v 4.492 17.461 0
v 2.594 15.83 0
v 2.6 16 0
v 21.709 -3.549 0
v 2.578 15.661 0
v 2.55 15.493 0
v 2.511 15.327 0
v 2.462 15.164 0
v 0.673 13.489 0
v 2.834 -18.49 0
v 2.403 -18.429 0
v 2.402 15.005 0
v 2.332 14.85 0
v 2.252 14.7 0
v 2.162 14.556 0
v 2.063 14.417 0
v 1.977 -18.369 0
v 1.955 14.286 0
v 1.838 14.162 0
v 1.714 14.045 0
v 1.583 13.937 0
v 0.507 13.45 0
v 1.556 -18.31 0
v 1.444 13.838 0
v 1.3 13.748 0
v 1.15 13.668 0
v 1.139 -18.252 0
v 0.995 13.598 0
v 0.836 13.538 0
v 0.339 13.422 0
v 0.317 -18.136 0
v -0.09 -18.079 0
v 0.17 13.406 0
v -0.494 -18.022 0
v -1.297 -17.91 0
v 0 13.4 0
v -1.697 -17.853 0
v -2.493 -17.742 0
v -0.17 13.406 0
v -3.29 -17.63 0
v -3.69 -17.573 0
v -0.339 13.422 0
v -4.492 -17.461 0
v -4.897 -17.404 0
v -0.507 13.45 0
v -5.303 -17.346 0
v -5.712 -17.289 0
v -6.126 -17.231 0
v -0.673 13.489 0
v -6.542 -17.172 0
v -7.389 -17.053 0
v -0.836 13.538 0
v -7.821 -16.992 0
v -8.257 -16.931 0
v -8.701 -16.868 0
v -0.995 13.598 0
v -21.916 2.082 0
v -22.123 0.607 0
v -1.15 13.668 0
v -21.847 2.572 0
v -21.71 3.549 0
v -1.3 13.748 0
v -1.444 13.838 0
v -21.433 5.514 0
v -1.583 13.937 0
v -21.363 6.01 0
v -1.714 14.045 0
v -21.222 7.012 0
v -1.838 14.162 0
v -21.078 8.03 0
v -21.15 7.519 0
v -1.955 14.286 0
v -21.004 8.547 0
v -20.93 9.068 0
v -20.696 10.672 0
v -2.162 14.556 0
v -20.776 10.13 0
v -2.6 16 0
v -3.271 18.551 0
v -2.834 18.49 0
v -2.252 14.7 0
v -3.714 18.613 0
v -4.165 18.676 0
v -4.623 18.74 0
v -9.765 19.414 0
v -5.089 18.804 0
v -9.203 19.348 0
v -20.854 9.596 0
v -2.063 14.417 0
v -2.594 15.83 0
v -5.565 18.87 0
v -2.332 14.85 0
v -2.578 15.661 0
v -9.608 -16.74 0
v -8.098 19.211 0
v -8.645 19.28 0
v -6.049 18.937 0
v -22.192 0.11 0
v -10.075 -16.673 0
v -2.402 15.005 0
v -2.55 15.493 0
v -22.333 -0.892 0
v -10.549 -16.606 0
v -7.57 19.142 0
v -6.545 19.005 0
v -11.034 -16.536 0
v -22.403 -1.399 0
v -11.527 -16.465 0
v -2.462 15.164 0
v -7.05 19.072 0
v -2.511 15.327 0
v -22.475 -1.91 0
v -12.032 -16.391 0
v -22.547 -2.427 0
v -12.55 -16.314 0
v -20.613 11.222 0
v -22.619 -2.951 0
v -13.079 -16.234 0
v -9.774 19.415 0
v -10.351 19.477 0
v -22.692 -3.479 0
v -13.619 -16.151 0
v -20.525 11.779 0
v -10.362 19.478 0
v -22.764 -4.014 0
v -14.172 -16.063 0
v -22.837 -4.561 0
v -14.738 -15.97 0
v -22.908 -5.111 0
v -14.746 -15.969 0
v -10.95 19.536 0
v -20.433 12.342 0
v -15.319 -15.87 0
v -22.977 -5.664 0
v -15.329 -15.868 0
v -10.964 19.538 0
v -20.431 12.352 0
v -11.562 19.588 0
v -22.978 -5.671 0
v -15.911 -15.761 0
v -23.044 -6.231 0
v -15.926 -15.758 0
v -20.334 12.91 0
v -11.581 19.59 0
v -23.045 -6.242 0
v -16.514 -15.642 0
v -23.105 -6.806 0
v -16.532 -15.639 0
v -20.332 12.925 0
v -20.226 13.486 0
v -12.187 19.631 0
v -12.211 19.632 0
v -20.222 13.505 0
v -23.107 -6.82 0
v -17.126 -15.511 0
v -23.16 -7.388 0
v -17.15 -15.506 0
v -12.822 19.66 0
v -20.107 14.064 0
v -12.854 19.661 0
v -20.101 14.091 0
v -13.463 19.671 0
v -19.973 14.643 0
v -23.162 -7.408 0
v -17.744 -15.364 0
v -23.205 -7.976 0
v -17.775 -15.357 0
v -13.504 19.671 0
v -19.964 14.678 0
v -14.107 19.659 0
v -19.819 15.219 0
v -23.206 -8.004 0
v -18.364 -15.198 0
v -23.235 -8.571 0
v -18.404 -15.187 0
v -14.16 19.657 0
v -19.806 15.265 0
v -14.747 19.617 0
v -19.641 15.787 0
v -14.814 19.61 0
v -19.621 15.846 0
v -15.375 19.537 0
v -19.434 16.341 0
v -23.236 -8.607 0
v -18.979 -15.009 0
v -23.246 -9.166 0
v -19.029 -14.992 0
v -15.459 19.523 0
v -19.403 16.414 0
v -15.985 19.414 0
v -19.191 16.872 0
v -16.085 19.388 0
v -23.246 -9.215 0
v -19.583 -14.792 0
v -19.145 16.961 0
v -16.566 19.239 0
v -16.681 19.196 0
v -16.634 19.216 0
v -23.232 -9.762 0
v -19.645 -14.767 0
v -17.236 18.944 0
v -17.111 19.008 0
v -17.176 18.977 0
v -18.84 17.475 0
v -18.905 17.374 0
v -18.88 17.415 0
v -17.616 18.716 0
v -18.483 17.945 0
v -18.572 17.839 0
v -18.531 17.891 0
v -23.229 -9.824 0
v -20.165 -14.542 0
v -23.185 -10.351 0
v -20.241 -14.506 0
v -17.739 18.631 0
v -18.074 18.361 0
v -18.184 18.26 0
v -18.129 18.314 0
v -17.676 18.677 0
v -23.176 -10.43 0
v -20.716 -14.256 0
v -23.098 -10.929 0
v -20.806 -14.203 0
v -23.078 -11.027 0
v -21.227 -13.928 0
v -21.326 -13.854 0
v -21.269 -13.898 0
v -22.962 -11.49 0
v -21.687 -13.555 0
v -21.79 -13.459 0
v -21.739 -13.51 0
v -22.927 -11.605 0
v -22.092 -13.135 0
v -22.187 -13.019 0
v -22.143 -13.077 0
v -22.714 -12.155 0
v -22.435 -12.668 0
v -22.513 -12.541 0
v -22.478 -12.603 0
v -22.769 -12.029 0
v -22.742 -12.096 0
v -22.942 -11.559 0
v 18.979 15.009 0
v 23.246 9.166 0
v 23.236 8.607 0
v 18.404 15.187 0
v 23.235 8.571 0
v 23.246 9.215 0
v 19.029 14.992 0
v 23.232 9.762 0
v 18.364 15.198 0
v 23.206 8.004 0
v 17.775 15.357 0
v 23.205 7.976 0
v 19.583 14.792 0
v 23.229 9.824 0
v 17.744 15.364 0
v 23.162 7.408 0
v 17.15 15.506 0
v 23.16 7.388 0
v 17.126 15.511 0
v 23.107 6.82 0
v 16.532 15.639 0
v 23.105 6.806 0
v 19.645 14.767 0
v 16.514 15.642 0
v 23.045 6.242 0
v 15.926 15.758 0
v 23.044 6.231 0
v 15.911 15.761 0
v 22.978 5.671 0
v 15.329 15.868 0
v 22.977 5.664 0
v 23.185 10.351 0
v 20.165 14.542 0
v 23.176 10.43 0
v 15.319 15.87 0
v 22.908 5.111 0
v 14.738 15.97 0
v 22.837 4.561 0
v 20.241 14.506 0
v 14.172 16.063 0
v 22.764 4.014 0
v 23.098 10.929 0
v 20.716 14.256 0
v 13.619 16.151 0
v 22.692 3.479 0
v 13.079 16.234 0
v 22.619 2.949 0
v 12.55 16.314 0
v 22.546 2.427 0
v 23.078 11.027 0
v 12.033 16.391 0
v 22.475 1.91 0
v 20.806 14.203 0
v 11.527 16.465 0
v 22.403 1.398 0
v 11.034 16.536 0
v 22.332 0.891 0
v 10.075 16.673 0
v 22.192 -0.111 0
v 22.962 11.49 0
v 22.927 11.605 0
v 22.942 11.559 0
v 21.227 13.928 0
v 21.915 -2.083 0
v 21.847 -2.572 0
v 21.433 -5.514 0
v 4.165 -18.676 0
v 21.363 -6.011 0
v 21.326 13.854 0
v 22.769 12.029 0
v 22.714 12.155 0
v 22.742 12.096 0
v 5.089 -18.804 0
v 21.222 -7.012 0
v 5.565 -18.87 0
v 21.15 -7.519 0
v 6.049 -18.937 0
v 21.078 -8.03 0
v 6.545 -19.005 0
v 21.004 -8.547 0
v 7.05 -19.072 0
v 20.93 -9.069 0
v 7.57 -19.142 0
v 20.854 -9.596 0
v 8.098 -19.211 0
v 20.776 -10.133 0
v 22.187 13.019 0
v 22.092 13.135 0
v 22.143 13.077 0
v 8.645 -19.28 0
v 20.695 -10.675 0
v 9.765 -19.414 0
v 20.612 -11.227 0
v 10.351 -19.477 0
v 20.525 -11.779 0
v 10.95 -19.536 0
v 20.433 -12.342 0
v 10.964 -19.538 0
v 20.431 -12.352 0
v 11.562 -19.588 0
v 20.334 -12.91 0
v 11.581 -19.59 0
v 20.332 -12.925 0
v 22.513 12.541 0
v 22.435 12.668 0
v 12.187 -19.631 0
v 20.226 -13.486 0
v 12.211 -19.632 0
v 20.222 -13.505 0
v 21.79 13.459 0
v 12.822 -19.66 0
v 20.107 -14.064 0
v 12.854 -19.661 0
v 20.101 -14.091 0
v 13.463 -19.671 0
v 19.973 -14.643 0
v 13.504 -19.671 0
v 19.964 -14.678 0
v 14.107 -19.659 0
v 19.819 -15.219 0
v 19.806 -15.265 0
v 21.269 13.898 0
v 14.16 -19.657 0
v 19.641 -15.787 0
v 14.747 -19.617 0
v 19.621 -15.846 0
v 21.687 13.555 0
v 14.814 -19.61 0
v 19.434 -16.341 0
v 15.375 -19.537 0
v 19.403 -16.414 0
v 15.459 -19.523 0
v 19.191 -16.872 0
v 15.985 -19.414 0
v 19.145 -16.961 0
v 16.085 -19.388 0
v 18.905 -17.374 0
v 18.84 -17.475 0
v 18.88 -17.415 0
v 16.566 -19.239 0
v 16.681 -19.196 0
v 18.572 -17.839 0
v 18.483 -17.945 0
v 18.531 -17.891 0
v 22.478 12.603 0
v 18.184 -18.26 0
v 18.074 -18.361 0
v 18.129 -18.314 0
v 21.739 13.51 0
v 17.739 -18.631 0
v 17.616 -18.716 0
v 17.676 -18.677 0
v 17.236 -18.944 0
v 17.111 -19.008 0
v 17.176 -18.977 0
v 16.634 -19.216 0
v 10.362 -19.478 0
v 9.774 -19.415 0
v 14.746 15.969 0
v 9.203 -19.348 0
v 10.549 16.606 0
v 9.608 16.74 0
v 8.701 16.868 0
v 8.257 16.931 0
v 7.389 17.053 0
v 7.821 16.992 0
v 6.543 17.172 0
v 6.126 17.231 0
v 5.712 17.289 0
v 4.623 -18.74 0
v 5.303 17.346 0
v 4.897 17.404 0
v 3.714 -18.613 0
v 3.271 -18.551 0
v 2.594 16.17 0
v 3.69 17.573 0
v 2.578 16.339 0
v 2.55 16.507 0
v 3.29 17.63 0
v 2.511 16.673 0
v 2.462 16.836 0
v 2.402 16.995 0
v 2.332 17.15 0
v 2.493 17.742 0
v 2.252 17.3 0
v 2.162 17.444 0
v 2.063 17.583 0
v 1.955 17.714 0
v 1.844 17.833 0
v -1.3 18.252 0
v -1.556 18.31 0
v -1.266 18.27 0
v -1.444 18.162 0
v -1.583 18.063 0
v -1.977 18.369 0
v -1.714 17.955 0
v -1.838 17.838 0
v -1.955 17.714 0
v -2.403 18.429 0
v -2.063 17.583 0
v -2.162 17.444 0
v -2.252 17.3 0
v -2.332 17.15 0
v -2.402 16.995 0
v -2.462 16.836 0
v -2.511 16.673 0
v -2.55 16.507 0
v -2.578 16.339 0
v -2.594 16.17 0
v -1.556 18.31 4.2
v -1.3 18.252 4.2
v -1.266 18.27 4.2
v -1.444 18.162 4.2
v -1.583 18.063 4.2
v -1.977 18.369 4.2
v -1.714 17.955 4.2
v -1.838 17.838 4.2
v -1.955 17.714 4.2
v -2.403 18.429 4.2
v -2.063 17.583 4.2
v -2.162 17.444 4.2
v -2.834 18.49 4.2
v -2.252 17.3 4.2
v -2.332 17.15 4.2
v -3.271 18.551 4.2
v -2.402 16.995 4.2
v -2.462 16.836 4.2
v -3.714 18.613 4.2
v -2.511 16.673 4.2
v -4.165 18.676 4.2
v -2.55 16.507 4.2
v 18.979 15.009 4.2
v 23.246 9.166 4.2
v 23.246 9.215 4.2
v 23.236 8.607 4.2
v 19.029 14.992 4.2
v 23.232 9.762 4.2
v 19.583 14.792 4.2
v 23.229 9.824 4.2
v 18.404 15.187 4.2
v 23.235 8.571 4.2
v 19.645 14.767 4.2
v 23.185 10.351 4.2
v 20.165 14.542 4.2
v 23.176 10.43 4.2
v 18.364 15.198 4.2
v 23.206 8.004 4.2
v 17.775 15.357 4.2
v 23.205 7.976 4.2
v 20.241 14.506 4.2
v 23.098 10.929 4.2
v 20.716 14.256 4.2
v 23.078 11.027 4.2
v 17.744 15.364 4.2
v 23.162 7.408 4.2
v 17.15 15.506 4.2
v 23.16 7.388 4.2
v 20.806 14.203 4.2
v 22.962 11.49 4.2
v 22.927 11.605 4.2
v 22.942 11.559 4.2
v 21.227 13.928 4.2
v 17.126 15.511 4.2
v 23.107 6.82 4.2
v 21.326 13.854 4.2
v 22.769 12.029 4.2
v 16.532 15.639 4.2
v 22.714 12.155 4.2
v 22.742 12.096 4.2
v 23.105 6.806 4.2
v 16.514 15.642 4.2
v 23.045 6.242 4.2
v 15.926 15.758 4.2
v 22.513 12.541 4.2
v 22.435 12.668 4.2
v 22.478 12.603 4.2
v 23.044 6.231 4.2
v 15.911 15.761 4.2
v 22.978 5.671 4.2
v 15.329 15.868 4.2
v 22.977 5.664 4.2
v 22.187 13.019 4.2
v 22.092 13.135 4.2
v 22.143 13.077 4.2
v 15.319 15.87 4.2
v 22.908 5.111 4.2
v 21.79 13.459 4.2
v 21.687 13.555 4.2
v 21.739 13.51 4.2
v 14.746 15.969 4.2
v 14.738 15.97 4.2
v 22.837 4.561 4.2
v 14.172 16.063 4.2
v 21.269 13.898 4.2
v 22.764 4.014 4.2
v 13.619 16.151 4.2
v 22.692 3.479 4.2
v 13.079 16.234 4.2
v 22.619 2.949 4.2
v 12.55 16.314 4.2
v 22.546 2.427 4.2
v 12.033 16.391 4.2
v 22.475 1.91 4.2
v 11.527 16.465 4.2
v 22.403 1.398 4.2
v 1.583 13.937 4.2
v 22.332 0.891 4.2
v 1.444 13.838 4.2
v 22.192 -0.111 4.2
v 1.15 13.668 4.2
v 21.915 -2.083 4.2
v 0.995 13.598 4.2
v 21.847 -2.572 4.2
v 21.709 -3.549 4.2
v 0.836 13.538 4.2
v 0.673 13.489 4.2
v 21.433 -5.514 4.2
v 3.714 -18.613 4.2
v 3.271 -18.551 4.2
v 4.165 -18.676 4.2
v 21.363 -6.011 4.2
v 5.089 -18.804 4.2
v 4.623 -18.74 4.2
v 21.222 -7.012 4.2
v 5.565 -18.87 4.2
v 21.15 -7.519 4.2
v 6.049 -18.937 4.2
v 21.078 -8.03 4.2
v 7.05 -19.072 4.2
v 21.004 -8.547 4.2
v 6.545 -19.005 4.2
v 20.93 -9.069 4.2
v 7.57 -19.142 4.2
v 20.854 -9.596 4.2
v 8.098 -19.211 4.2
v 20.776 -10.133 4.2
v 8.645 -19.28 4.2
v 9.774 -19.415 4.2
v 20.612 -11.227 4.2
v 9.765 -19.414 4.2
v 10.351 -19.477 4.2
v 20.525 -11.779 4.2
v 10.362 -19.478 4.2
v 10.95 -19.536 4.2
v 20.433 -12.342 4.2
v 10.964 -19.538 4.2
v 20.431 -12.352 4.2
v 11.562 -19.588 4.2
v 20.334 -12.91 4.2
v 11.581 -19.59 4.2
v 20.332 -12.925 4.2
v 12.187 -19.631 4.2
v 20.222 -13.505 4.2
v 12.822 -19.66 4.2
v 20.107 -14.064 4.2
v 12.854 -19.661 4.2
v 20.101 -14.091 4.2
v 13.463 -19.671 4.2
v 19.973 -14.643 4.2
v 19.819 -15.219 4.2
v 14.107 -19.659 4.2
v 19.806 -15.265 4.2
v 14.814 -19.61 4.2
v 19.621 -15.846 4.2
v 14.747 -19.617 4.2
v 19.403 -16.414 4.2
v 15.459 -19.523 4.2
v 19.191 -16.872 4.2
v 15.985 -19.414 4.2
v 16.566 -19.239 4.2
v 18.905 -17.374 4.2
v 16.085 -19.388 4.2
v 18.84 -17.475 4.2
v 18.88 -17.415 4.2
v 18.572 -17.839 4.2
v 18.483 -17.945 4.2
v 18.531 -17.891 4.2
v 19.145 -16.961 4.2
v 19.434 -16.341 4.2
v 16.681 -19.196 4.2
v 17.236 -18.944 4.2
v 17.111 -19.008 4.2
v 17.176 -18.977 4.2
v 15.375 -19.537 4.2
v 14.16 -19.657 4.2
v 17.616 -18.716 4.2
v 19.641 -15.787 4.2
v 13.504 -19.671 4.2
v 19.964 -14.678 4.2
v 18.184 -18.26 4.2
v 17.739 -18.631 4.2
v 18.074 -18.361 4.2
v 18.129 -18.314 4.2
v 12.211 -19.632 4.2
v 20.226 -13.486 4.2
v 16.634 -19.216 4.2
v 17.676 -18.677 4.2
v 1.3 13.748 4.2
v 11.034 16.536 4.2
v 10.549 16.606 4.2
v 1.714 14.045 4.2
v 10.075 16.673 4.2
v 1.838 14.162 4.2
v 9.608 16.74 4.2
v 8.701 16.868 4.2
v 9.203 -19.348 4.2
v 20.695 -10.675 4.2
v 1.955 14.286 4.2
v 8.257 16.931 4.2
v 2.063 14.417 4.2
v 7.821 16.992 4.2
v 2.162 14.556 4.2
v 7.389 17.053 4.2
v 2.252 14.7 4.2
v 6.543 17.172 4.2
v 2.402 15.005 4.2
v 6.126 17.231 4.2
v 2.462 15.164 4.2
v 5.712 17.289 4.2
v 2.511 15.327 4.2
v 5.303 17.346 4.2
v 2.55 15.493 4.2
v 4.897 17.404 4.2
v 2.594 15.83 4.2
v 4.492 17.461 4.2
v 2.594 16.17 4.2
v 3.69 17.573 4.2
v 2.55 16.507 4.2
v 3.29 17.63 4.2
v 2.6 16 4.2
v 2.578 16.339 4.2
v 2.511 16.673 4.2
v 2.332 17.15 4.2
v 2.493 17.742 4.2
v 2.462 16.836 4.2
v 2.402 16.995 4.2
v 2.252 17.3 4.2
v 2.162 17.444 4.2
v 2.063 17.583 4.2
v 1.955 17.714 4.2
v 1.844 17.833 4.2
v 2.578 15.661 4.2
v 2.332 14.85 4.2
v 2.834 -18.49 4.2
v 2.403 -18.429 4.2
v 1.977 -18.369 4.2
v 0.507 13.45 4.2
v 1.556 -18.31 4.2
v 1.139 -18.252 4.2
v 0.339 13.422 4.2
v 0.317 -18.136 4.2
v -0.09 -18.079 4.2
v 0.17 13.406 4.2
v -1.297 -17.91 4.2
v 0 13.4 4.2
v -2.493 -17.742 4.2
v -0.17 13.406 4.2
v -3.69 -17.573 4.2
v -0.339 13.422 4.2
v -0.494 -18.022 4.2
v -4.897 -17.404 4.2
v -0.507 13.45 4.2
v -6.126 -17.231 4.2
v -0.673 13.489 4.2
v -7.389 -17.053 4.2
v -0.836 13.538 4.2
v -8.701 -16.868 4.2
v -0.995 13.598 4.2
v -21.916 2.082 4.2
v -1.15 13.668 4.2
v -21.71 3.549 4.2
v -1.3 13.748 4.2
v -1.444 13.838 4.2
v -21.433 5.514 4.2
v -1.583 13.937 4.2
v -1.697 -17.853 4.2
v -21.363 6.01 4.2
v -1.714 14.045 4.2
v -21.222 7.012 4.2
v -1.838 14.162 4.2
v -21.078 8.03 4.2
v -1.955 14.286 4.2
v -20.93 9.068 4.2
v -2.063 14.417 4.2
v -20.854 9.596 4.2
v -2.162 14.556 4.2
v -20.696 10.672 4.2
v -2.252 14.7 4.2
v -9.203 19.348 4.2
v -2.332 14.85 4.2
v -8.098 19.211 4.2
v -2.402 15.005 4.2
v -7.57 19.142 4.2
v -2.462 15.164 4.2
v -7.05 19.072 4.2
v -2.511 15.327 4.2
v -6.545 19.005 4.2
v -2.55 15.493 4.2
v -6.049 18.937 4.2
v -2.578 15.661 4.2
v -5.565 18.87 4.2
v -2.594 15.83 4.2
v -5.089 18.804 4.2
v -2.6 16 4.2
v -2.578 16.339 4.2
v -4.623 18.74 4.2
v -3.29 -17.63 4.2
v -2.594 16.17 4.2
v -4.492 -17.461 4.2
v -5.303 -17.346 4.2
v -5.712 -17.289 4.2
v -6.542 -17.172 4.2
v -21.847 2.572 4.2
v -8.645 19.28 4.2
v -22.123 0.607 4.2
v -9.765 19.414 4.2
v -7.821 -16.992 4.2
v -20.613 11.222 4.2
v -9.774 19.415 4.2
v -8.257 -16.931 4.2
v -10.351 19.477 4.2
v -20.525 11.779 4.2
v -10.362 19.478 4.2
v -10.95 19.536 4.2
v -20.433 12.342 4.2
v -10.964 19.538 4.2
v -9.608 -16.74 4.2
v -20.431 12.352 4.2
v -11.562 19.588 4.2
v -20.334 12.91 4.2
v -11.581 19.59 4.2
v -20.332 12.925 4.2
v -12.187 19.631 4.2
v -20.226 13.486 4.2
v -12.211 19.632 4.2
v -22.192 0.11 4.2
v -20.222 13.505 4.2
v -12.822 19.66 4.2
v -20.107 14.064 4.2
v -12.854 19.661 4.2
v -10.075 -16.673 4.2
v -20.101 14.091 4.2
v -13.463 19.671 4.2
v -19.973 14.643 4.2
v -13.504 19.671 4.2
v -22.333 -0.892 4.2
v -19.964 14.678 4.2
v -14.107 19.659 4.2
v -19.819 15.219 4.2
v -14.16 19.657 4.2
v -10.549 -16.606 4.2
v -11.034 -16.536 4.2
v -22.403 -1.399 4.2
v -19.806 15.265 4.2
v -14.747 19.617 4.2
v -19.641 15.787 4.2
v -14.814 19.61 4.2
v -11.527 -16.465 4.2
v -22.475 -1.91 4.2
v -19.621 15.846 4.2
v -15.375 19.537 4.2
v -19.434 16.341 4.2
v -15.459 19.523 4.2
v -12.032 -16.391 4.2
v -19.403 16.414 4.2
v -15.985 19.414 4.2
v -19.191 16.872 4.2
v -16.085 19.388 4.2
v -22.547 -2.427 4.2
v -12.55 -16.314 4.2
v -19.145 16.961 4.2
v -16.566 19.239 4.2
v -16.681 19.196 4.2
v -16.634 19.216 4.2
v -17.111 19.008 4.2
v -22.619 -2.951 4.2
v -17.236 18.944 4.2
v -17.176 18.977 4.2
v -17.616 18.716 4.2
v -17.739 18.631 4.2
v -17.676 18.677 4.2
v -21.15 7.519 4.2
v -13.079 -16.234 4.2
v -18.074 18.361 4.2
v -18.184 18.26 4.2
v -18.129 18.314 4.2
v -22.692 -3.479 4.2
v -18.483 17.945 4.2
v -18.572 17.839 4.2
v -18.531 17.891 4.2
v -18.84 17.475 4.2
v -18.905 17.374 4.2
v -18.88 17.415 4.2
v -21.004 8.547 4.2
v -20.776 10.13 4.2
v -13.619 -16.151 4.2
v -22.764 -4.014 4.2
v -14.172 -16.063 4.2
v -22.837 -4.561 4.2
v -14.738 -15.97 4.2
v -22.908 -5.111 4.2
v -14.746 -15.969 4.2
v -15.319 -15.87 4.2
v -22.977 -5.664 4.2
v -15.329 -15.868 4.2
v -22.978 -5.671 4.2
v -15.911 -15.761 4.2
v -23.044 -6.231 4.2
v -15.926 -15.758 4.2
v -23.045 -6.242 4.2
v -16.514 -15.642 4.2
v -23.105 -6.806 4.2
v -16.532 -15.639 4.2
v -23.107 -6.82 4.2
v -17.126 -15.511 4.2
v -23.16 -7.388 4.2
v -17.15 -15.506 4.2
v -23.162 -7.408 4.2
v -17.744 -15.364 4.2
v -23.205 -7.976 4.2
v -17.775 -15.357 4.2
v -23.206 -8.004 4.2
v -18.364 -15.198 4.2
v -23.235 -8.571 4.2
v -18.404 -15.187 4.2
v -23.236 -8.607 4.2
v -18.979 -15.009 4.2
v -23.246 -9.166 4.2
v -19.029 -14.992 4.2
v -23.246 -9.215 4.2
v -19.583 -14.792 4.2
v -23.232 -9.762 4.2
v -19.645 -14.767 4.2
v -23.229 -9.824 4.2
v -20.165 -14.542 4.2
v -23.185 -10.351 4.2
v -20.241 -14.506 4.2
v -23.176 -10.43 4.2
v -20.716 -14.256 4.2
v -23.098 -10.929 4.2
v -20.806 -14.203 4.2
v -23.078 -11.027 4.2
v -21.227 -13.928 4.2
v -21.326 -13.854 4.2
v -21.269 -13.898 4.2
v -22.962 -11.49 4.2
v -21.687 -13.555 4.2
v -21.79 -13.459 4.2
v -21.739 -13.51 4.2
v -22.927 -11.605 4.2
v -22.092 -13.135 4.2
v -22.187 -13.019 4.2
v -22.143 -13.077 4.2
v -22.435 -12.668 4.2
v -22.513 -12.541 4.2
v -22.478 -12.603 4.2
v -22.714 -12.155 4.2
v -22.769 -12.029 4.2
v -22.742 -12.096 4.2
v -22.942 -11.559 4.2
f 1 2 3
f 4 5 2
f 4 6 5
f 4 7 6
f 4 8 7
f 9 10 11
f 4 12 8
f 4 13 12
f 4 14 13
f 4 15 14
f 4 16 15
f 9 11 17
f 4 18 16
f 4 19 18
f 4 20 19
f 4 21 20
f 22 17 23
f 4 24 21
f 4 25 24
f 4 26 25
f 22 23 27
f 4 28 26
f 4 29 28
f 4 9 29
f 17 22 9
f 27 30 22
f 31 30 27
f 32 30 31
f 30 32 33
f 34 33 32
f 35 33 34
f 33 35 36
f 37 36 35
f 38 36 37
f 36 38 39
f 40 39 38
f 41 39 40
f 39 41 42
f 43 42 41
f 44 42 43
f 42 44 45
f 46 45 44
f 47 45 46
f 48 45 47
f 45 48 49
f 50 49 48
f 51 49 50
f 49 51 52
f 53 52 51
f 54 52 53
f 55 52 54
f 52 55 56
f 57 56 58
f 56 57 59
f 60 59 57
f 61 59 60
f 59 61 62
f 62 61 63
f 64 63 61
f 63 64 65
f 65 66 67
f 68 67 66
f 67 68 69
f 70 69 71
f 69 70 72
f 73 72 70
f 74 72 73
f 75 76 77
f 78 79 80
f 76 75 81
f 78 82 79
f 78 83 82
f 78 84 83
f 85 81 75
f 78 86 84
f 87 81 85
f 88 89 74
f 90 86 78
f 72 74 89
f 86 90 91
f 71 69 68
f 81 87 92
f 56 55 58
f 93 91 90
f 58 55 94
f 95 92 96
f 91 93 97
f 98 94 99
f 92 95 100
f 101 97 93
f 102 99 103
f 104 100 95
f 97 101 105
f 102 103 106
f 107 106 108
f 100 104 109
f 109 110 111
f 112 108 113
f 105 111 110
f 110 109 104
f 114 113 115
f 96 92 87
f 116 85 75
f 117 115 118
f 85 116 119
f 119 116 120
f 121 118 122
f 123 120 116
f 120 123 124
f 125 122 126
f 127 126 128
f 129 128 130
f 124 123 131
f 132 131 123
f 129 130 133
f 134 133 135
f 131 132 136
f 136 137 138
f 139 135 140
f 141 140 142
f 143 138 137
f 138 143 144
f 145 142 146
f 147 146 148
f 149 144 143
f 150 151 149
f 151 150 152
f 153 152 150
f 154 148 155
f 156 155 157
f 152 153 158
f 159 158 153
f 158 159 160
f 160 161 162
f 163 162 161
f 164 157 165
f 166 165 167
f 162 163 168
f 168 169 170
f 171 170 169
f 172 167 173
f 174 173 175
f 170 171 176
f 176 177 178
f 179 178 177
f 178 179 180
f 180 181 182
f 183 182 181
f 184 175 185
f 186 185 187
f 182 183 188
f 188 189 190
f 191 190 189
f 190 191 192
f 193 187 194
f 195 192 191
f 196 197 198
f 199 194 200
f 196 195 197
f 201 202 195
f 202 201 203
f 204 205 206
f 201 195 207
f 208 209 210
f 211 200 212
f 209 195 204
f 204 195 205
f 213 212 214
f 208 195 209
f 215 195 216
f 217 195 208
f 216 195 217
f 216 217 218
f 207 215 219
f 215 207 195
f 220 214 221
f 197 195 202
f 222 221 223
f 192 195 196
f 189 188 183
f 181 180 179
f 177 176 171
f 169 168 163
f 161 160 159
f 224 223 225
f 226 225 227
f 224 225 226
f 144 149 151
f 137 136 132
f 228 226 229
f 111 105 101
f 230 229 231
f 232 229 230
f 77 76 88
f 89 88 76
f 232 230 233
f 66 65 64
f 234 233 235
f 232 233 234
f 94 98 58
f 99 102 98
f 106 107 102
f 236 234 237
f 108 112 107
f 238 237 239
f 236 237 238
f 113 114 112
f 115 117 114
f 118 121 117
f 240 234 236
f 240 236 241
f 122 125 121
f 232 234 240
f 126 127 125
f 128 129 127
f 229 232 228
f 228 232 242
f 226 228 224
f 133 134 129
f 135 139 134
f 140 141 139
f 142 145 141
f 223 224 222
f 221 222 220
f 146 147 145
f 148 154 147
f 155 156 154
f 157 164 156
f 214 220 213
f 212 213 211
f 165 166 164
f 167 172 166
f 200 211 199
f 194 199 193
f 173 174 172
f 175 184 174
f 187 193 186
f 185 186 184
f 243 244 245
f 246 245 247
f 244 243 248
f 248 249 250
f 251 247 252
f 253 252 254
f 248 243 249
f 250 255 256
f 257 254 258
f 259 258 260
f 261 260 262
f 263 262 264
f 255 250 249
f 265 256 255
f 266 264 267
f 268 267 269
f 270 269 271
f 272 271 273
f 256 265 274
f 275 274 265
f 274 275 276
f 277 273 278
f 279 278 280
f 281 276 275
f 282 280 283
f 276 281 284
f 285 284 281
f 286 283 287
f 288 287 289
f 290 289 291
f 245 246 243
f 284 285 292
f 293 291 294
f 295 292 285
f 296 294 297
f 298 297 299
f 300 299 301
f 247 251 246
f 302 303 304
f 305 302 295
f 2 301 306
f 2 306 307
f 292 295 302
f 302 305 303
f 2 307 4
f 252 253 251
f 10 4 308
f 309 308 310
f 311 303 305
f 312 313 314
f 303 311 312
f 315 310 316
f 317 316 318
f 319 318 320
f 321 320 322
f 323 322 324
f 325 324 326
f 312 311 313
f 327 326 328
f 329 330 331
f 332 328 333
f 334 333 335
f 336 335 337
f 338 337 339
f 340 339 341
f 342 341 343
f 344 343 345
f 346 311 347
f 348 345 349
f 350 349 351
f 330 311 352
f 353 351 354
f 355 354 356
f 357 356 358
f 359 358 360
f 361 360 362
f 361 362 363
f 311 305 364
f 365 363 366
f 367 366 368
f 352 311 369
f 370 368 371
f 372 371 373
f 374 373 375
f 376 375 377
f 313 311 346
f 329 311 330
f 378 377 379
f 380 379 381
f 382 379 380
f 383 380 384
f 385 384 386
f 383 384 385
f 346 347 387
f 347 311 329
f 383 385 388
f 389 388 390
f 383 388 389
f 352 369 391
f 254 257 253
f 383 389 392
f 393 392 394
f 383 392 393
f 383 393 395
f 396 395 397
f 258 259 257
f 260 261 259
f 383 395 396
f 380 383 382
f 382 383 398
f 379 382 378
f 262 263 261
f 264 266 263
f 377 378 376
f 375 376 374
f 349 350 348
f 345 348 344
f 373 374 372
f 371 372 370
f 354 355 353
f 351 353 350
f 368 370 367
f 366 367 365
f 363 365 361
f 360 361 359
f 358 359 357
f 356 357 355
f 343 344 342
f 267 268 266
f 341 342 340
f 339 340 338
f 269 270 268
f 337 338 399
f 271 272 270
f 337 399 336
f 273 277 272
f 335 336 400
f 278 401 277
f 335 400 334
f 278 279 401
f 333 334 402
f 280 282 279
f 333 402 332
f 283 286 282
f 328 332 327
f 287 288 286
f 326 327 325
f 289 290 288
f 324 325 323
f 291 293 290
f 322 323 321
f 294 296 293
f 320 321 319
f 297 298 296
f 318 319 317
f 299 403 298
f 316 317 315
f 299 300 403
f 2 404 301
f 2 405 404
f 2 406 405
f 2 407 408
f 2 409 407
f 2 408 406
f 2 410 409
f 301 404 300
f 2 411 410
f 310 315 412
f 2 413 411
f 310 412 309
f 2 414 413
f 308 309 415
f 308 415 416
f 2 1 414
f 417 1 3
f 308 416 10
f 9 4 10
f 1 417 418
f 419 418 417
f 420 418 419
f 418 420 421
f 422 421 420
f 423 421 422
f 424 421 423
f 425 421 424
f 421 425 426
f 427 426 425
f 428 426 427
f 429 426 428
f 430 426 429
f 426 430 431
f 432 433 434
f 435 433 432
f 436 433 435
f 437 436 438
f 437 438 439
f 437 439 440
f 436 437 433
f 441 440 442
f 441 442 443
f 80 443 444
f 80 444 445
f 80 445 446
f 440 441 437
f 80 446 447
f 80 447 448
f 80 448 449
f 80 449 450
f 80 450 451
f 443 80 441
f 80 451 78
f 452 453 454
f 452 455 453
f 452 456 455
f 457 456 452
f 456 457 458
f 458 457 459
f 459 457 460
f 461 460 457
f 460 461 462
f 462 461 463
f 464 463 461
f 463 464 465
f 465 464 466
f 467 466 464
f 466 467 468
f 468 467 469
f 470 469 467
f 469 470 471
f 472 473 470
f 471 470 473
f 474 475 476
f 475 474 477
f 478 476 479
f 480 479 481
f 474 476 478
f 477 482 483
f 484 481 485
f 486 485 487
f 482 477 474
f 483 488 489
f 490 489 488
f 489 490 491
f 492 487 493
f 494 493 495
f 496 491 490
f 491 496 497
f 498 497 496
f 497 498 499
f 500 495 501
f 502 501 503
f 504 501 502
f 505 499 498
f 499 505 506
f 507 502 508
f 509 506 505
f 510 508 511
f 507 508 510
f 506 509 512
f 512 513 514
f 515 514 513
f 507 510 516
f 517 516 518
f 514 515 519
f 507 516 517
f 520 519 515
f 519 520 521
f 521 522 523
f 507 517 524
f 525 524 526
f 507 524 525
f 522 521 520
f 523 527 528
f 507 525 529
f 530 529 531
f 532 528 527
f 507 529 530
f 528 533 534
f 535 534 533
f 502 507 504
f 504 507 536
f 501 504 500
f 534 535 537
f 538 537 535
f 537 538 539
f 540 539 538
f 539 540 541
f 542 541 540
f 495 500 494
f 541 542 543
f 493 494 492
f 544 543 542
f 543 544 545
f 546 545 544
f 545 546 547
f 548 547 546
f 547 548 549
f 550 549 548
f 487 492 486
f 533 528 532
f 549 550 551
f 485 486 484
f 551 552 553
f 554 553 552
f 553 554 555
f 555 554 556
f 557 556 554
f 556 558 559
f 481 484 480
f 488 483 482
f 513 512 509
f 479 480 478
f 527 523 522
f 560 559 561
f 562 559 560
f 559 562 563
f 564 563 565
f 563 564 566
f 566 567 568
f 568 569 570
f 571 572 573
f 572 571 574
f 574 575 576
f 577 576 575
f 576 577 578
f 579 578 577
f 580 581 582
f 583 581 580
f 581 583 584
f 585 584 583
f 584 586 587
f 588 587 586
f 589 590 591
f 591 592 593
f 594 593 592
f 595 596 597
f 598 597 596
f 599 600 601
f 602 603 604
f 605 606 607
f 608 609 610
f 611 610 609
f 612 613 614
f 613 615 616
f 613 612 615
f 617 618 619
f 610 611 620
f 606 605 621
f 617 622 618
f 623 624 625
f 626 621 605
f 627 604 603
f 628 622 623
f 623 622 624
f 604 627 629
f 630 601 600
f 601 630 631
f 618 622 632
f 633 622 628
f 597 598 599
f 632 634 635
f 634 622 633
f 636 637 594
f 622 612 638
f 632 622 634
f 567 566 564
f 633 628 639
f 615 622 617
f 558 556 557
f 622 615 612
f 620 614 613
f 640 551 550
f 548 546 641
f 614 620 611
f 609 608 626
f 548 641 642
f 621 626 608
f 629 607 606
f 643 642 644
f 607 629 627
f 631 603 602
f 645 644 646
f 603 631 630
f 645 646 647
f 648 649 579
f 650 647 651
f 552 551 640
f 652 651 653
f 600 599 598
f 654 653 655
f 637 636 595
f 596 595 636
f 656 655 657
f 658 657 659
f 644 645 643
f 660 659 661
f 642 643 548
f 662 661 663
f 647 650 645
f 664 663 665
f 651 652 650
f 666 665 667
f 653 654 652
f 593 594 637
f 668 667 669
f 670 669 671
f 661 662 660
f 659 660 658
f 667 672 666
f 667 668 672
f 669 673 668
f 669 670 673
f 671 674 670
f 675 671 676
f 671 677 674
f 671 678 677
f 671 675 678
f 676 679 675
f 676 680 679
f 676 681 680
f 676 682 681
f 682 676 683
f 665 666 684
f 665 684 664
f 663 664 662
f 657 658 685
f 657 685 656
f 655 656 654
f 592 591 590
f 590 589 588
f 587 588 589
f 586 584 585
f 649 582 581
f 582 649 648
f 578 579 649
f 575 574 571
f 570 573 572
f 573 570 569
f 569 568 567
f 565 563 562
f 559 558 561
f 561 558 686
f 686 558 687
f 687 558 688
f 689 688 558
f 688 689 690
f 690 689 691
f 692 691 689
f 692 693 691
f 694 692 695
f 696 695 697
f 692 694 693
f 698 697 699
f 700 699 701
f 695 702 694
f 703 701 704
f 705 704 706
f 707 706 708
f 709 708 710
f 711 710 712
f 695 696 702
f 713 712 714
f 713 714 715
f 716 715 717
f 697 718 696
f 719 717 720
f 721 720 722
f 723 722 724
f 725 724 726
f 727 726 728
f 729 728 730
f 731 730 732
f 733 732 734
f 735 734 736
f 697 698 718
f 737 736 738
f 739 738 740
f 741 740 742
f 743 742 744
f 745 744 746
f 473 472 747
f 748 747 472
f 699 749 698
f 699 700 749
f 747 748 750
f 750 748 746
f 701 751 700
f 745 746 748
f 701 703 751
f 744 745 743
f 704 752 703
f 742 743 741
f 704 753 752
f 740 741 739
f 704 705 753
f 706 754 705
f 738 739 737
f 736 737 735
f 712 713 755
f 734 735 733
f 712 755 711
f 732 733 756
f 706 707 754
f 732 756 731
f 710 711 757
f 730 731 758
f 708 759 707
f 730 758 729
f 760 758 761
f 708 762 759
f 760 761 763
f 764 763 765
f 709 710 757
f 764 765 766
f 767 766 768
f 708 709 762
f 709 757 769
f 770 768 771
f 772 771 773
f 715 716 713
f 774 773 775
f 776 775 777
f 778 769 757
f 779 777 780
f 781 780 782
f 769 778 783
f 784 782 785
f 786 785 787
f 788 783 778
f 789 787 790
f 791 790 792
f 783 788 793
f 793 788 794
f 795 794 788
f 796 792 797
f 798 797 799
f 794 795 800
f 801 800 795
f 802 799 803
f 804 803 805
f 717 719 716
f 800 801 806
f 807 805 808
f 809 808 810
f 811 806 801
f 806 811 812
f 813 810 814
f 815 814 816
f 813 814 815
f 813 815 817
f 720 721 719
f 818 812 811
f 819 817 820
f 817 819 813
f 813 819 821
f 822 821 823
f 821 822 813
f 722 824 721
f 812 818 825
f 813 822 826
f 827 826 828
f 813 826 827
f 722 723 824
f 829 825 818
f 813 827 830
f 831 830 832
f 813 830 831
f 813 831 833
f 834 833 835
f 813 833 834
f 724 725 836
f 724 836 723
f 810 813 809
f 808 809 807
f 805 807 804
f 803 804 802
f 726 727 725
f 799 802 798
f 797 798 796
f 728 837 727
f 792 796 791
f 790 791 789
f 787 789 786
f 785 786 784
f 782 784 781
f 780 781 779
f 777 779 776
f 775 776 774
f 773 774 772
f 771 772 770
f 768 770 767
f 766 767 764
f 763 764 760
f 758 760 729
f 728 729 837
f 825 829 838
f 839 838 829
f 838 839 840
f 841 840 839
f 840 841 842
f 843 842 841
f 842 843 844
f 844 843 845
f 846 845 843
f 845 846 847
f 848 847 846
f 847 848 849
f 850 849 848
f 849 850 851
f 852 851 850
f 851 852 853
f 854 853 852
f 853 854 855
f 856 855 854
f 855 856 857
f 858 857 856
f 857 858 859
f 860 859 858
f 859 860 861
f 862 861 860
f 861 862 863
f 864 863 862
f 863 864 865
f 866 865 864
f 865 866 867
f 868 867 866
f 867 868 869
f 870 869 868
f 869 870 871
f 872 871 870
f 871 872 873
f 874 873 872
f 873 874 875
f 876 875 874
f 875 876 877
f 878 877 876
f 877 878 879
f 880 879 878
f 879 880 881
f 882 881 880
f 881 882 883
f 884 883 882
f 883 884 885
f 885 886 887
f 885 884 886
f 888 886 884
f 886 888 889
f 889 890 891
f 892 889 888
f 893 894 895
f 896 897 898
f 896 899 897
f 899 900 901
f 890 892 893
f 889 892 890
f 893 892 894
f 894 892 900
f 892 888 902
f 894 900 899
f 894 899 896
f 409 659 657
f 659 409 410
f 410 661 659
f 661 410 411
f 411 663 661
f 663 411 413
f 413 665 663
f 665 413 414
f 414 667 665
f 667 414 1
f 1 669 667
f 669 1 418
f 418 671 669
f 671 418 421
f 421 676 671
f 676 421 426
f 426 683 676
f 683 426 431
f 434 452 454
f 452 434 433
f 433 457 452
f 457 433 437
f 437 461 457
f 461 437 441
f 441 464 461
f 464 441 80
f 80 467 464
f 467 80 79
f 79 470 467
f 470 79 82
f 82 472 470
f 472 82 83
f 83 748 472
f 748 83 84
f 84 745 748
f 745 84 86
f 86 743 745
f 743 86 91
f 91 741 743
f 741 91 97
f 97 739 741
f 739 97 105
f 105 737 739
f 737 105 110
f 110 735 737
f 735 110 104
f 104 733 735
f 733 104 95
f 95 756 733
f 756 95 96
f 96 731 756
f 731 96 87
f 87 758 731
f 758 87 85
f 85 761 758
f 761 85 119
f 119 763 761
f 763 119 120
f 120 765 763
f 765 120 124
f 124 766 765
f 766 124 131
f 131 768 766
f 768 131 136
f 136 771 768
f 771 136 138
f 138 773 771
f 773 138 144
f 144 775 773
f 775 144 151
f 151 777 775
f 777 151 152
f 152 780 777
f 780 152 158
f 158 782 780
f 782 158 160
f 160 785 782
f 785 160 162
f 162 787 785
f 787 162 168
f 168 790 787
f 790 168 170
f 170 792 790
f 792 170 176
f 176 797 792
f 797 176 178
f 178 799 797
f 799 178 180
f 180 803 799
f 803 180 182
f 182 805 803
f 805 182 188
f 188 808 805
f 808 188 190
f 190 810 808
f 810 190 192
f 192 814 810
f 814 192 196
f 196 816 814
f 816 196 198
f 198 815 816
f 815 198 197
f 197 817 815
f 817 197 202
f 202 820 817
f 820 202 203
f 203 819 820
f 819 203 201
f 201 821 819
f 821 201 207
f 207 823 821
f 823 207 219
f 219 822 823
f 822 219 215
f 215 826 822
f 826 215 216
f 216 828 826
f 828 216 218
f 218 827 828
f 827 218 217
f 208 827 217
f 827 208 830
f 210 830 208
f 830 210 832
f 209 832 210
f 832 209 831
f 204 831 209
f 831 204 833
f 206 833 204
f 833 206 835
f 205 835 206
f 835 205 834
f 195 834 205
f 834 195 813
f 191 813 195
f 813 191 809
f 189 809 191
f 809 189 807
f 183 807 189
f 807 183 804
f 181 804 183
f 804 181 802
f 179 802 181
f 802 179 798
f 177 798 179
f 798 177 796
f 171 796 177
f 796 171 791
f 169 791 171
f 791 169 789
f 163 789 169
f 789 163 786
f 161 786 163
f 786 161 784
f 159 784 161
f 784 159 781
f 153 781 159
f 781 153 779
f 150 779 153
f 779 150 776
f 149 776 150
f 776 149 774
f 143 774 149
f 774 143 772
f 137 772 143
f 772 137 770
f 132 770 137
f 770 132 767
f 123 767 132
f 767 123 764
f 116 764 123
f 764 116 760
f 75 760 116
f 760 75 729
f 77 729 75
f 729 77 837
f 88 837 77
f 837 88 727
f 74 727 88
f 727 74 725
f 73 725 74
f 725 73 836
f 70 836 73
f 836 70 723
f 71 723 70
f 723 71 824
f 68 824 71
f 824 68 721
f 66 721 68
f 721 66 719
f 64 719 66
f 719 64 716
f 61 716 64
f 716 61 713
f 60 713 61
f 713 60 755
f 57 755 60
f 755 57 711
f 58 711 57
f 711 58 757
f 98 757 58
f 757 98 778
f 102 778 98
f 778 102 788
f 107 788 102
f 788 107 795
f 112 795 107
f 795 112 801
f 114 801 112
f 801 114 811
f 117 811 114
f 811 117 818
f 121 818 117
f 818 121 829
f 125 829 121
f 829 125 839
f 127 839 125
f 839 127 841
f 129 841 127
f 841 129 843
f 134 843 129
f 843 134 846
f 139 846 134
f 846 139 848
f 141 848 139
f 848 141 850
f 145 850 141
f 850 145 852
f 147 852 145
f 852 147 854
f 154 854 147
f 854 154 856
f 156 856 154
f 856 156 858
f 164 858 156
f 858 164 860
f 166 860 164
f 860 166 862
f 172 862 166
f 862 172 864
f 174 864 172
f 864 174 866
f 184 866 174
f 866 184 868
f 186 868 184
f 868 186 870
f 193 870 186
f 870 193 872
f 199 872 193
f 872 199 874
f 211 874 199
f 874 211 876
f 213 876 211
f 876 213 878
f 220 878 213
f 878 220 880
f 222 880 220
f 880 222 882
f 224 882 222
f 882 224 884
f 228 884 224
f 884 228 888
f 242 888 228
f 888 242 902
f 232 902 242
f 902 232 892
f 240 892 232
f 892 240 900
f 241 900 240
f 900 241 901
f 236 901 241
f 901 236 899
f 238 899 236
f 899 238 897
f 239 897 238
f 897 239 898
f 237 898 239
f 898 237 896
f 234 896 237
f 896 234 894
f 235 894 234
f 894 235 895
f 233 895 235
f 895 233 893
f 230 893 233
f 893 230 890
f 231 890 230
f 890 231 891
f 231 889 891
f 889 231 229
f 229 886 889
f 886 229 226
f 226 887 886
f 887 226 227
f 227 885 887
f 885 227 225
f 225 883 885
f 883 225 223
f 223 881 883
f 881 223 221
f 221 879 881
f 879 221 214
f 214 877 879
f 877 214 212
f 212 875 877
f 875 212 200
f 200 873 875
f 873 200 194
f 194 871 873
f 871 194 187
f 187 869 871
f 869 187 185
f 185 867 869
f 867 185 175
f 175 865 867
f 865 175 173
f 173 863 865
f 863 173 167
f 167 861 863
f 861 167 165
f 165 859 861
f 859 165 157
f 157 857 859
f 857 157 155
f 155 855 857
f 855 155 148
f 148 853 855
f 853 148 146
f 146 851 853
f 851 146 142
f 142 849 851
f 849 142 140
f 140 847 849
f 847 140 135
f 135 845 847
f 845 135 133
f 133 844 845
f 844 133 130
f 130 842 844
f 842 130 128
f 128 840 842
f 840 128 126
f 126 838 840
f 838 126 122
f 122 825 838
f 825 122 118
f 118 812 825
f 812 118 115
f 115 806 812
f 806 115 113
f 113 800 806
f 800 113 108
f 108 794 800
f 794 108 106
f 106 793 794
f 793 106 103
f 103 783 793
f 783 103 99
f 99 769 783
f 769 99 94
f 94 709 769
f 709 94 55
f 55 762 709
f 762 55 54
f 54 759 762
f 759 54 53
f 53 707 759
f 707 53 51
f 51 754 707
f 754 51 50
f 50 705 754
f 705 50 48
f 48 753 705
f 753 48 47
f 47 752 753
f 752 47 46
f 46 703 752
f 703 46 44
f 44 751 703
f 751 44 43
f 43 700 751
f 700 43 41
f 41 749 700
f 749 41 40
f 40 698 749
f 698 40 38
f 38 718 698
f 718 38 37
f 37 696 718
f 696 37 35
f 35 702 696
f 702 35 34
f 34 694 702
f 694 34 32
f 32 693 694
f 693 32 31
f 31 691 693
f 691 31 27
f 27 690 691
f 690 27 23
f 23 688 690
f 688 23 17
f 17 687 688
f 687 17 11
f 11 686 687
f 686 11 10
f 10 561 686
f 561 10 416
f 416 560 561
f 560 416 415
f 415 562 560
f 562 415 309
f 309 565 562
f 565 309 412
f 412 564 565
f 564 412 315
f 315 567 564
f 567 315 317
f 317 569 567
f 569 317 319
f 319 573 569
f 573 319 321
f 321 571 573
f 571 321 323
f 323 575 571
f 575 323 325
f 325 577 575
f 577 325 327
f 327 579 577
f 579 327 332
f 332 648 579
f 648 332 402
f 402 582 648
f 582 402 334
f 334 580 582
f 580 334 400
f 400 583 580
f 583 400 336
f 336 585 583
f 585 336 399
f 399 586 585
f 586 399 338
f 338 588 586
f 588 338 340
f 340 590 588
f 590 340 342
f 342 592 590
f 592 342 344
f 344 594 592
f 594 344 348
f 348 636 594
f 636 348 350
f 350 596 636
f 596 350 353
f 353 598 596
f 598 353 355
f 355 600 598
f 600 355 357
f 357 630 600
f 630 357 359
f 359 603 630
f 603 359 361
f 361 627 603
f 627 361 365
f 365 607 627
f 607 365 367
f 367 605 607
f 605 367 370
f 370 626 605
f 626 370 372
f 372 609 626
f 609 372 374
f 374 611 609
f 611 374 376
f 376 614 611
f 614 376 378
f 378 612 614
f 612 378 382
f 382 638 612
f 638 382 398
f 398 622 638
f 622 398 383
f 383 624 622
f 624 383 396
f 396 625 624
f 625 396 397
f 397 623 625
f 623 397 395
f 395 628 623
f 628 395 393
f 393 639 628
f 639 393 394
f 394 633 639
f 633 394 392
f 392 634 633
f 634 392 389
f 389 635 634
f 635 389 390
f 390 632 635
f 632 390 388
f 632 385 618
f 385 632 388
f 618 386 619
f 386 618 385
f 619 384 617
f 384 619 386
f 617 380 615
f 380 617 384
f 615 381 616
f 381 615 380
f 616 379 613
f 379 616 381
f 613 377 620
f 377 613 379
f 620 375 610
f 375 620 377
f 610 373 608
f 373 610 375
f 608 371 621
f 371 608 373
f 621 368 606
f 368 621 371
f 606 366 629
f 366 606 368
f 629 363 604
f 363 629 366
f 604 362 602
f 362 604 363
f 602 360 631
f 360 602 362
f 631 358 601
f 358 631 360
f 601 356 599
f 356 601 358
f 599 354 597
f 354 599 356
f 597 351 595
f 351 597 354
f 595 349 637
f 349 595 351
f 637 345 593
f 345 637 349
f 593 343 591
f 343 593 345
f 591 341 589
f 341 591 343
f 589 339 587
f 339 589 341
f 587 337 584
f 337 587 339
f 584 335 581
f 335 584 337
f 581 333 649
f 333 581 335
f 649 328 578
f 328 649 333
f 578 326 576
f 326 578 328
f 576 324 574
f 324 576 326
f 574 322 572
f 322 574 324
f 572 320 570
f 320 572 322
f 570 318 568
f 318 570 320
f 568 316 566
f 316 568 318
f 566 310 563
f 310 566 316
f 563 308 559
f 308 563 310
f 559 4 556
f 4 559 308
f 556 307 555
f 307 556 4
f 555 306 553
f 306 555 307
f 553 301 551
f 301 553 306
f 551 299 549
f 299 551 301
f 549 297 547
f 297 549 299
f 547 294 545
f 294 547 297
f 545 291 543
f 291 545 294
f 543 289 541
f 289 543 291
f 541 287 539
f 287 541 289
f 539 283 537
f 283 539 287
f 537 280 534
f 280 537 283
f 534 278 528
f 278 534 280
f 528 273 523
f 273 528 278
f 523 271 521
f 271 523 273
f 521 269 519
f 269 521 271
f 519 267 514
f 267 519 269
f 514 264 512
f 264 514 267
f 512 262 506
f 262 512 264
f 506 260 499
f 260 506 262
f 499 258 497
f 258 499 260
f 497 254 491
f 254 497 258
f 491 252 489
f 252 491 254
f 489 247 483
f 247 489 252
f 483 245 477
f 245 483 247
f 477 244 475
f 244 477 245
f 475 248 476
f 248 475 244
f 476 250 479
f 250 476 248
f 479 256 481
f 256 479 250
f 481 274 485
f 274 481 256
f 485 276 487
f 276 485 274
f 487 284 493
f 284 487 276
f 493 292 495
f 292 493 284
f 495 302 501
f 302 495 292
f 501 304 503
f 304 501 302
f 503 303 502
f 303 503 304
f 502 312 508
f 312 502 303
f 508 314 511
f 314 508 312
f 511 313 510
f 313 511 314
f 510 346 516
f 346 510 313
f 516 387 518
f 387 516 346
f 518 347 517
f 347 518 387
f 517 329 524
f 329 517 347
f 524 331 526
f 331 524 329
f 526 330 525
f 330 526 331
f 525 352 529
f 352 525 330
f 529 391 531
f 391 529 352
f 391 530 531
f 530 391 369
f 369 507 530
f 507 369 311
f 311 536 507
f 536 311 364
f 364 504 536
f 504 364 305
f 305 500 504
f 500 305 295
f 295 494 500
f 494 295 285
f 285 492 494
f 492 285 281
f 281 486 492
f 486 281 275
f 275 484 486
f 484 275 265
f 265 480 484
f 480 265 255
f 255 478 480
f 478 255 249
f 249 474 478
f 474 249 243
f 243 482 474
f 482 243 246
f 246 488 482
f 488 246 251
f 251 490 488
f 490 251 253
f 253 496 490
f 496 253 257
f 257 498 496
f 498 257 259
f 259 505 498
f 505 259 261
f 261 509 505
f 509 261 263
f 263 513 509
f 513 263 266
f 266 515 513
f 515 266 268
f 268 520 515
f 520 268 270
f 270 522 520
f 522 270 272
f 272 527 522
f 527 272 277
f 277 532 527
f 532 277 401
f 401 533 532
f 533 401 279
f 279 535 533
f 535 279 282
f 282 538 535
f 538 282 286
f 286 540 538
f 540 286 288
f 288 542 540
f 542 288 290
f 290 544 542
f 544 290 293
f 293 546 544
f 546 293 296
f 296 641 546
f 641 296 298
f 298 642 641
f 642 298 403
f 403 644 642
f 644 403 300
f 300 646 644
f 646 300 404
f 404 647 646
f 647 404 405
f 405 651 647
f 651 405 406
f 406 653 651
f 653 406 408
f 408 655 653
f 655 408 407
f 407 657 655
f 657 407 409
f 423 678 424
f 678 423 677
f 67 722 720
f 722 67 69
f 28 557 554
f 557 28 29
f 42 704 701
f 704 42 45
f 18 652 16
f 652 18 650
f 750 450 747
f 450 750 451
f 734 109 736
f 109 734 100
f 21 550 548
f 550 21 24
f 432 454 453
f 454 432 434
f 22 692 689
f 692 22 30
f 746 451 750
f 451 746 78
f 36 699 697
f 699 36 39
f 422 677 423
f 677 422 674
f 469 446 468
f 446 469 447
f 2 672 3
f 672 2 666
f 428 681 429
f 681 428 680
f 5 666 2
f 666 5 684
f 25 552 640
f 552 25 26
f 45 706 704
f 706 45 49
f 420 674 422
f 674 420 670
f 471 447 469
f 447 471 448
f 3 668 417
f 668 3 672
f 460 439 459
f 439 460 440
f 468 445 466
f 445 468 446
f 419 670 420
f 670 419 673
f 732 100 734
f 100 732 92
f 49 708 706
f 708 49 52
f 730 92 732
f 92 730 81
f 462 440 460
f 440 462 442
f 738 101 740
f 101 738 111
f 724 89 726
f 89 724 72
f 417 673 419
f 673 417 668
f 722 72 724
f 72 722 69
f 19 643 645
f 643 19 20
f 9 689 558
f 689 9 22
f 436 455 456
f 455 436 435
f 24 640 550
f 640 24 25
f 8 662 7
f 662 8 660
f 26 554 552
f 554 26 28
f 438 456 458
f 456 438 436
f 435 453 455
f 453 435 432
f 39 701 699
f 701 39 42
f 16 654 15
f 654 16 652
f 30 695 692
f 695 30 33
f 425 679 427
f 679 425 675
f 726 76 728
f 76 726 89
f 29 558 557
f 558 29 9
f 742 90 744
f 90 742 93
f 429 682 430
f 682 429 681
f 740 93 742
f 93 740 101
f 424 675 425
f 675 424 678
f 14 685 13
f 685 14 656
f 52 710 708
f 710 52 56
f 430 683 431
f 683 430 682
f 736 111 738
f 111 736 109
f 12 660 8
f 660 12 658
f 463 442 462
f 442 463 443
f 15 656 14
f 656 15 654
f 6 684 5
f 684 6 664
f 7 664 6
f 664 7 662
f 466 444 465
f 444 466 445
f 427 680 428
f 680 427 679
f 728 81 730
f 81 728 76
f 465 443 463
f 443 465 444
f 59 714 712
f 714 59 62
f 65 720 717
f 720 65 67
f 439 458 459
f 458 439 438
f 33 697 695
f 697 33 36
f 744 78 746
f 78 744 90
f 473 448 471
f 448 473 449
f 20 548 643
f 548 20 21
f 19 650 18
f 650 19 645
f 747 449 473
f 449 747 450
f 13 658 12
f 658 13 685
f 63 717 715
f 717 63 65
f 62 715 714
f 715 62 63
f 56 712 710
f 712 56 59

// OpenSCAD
$fn=96;
thickness_mm = 4.2;
pts = [[21.7782, -3.0607], [21.8469, -2.5719], [21.9155, -2.0826], [21.9843, -1.5924], [22.0533, -1.1006], [22.1226, -0.6069], [22.1922, -0.1106], [22.2621, 0.3886], [22.3325, 0.8914], [22.4034, 1.3983], [22.4747, 1.9098], [22.5465, 2.4266], [22.6189, 2.9492], [22.6914, 3.478], [22.7641, 4.0139], [22.8363, 4.5573], [22.9077, 5.1085], [22.9774, 5.6681], [23.0441, 6.2363], [23.106, 6.813], [23.1609, 7.3979], [23.2057, 7.9904], [23.2359, 8.5887], [23.2467, 9.1906], [23.2312, 9.7927], [23.1819, 10.3906], [23.0903, 10.9782], [22.9474, 11.5485], [22.7454, 12.0939], [22.4784, 12.6069], [22.1434, 13.0806], [21.7417, 13.5104], [21.2784, 13.8939], [20.7623, 14.2314], [20.2039, 14.5256], [19.6144, 14.7805], [19.0046, 15.0013], [18.3839, 15.193], [17.7596, 15.3606], [17.138, 15.5086], [16.5231, 15.6406], [15.9178, 15.7599], [15.3241, 15.8686], [14.7431, 15.9691], [14.1753, 16.0627], [13.6209, 16.1508], [13.0794, 16.2343], [12.5505, 16.3141], [12.0337, 16.3905], [11.5285, 16.4644], [11.034, 16.536], [10.5498, 16.6055], [10.0749, 16.6732], [9.609, 16.7395], [9.1512, 16.8043], [8.701, 16.868], [8.2577, 16.9306], [7.8207, 16.9922], [7.3895, 17.0529], [6.9637, 17.1129], [6.5427, 17.1722], [6.126, 17.2308], [5.713, 17.289], [5.3034, 17.3465], [4.8967, 17.4037], [4.4924, 17.4606], [4.0902, 17.5171], [3.6896, 17.5734], [3.2902, 17.6296], [2.8916, 17.6856], [2.4934, 17.7415], [2.0952, 17.7975], [1.6966, 17.8535], [1.2973, 17.9097], [0.8966, 17.966], [0.4945, 18.0225], [0.0901, 18.0792], [-0.3166, 18.1364], [-0.7262, 18.1939], [-1.1392, 18.2519], [-1.5559, 18.3103], [-1.977, 18.3694], [-2.4028, 18.4292], [-2.834, 18.4897], [-3.2711, 18.5509], [-3.7144, 18.6129], [-4.1648, 18.6758], [-4.6227, 18.7396], [-5.0889, 18.8043], [-5.564, 18.8701], [-6.0487, 18.9368], [-6.5437, 19.0043], [-7.0497, 19.0725], [-7.5676, 19.1415], [-8.0979, 19.2106], [-8.6415, 19.2796], [-9.1987, 19.3477], [-9.7703, 19.4142], [-10.3565, 19.4778], [-10.9571, 19.5369], [-11.5718, 19.5891], [-12.1993, 19.6317], [-12.8377, 19.6608], [-13.4839, 19.6717], [-14.1335, 19.6585], [-14.7805, 19.6144], [-15.4174, 19.5319], [-16.0353, 19.403], [-16.6245, 19.2208], [-17.1755, 18.9799], [-17.6801, 18.6775], [-18.1327, 18.3144], [-18.5307, 17.8949], [-18.8752, 17.4263], [-19.1698, 16.9175], [-19.4198, 16.3779], [-19.632, 15.8168], [-19.8129, 15.2423], [-19.9685, 14.6606], [-20.1043, 14.0772], [-20.2245, 13.4953], [-20.3331, 12.9179], [-20.4324, 12.3465], [-20.5249, 11.782], [-20.6122, 11.2248], [-20.6955, 10.6752], [-20.7758, 10.1331], [-20.8537, 9.5979], [-20.9298, 9.0695], [-21.0043, 8.5473], [-21.0777, 8.0307], [-21.1501, 7.5193], [-21.2217, 7.0125], [-21.2926, 6.5098], [-21.363, 6.0106], [-21.4329, 5.5145], [-21.5024, 5.0207], [-21.5716, 4.529], [-21.6406, 4.0388], [-21.7095, 3.5495], [-21.7782, 3.0607], [-21.8469, 2.5719], [-21.9155, 2.0826], [-21.9843, 1.5924], [-22.0533, 1.1006], [-22.1226, 0.6069], [-22.1922, 0.1106], [-22.2621, -0.3886], [-22.3325, -0.8914], [-22.4034, -1.3983], [-22.4747, -1.9098], [-22.5465, -2.4266], [-22.6189, -2.9492], [-22.6914, -3.478], [-22.7641, -4.0139], [-22.8363, -4.5573], [-22.9077, -5.1085], [-22.9774, -5.6681], [-23.0441, -6.2363], [-23.106, -6.813], [-23.1609, -7.3979], [-23.2057, -7.9904], [-23.2359, -8.5887], [-23.2467, -9.1906], [-23.2312, -9.7927], [-23.1819, -10.3906], [-23.0903, -10.9782], [-22.9474, -11.5485], [-22.7454, -12.0939], [-22.4784, -12.6069], [-22.1434, -13.0806], [-21.7417, -13.5104], [-21.2784, -13.8939], [-20.7623, -14.2314], [-20.2039, -14.5256], [-19.6144, -14.7805], [-19.0046, -15.0013], [-18.3839, -15.193], [-17.7596, -15.3606], [-17.138, -15.5086], [-16.5231, -15.6406], [-15.9178, -15.7599], [-15.3241, -15.8686], [-14.7431, -15.9691], [-14.1753, -16.0627], [-13.6209, -16.1508], [-13.0794, -16.2343], [-12.5505, -16.3141], [-12.0337, -16.3905], [-11.5285, -16.4644], [-11.034, -16.536], [-10.5498, -16.6055], [-10.0749, -16.6732], [-9.609, -16.7395], [-9.1512, -16.8043], [-8.701, -16.868], [-8.2577, -16.9306], [-7.8207, -16.9922], [-7.3895, -17.0529], [-6.9637, -17.1129], [-6.5427, -17.1722], [-6.126, -17.2308], [-5.713, -17.289], [-5.3034, -17.3465], [-4.8967, -17.4037], [-4.4924, -17.4606], [-4.0902, -17.5171], [-3.6896, -17.5734], [-3.2902, -17.6296], [-2.8916, -17.6856], [-2.4934, -17.7415], [-2.0952, -17.7975], [-1.6966, -17.8535], [-1.2973, -17.9097], [-0.8966, -17.966], [-0.4945, -18.0225], [-0.0901, -18.0792], [0.3166, -18.1364], [0.7262, -18.1939], [1.1392, -18.2519], [1.5559, -18.3103], [1.977, -18.3694], [2.4028, -18.4292], [2.834, -18.4897], [3.2711, -18.5509], [3.7144, -18.6129], [4.1648, -18.6758], [4.6227, -18.7396], [5.0889, -18.8043], [5.564, -18.8701], [6.0487, -18.9368], [6.5437, -19.0043], [7.0497, -19.0725], [7.5676, -19.1415], [8.0979, -19.2106], [8.6415, -19.2796], [9.1987, -19.3477], [9.7703, -19.4142], [10.3565, -19.4778], [10.9571, -19.5369], [11.5718, -19.5891], [12.1993, -19.6317], [12.8377, -19.6608], [13.4839, -19.6717], [14.1335, -19.6585], [14.7805, -19.6144], [15.4174, -19.5319], [16.0353, -19.403], [16.6245, -19.2208], [17.1755, -18.9799], [17.6801, -18.6775], [18.1327, -18.3144], [18.5307, -17.8949], [18.8752, -17.4263], [19.1698, -16.9175], [19.4198, -16.3779], [19.632, -15.8168], [19.8129, -15.2423], [19.9685, -14.6606], [20.1043, -14.0772], [20.2245, -13.4953], [20.3331, -12.9179], [20.4324, -12.3465], [20.5249, -11.782], [20.6122, -11.2248], [20.6955, -10.6752], [20.7758, -10.1331], [20.8537, -9.5979], [20.9298, -9.0695], [21.0043, -8.5473], [21.0777, -8.0307], [21.1501, -7.5193], [21.2217, -7.0125], [21.2926, -6.5098], [21.363, -6.0106], [21.4329, -5.5145], [21.5024, -5.0207], [21.5716, -4.529], [21.6406, -4.0388], [21.7095, -3.5495]];
hole = [0.0, 16.0, 2.6];
offset_r = 1.1;
module shape2d(){
  // CGAL fix + style control
  offset(r=offset_r) offset(r=-offset_r)
    polygon(points=pts, paths=[[for(i=[0:len(pts)-1]) i]]);
}
module body(){
  linear_extrude(height=thickness_mm, convexity=10)
    shape2d();
}
difference(){
  body();
  translate([hole[0], hole[1], -1])
    cylinder(h=thickness_mm+2, r=hole[2]);
}
